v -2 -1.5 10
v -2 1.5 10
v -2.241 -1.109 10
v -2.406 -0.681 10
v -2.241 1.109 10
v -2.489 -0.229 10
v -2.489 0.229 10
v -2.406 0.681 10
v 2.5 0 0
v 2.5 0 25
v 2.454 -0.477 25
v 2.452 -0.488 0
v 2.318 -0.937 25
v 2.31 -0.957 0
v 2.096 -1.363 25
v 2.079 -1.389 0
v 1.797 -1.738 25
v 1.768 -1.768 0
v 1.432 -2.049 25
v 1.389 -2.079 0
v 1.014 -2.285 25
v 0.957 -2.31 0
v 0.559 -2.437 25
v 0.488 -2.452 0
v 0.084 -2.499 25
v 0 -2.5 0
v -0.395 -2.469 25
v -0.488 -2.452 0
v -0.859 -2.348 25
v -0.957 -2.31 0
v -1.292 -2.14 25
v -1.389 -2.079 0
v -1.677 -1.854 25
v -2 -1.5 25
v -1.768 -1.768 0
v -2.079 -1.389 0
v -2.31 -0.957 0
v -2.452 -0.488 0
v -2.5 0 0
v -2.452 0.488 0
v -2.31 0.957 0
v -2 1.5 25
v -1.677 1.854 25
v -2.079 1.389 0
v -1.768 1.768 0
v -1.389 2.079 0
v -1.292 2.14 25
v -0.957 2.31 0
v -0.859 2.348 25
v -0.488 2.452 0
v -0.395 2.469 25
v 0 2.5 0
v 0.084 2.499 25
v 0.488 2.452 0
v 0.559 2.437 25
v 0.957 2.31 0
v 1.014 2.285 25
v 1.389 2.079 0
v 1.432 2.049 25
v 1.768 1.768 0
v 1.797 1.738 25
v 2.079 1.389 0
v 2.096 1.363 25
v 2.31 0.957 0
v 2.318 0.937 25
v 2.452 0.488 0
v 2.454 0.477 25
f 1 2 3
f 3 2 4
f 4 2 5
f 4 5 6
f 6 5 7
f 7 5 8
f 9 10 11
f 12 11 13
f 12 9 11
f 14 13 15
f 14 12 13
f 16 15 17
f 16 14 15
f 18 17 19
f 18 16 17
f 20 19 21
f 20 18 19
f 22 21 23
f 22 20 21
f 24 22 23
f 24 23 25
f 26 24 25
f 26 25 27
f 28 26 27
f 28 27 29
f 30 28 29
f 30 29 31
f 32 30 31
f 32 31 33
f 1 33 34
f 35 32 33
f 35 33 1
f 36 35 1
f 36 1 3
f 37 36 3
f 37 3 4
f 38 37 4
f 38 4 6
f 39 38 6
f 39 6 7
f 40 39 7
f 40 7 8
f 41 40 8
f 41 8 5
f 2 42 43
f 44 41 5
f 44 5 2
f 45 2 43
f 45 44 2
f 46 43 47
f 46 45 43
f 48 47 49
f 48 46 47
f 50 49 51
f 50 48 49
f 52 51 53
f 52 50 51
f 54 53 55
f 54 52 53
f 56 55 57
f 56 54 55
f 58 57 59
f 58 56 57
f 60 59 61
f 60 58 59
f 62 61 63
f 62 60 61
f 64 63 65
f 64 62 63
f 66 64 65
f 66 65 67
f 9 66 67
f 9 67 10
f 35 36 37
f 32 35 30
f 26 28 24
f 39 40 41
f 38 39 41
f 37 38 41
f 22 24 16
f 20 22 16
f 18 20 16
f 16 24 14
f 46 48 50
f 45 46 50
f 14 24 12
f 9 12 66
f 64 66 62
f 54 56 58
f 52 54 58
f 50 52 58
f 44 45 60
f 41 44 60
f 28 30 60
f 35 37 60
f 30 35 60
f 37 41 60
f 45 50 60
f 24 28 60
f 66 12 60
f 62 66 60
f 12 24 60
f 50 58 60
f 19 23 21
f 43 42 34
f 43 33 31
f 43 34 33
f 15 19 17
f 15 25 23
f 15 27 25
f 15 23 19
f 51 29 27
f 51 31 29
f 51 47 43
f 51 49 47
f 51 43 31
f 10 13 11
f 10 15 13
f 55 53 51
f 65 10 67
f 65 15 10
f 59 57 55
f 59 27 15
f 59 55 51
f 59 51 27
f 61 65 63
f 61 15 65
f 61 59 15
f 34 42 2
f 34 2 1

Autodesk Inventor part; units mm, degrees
ref_plane "YZ Plane" through (0, 0, 0) normal (1, 0, 0) x (0, 1, 0)
ref_plane "XZ Plane" through (0, 0, 0) normal (0, 1, 0) x (-1, 0, 0)
ref_plane "XY Plane" through (0, 0, 0) normal (0, 0, 1) x (1, 0, 0)
sketch "Sketch1" plane through (0, 0, 0) normal (0, 0, 1) x (1, 0, 0)
  circle A0 centre (0, 0) radius 2.5
  dimension "d0" = 5
extrude "Extrusion1" add sketch "Sketch1" along normal blind 25
sketch "Sketch2" plane through (0, 0, 25) normal (0, 0, 1) x (1, 0, 0)
  circle A0 centre (0, 0) radius 2.5 projected
  line L0 (2.5, 0) -> (-2, 0)
  line L1 (-2, 0) -> (-2, 4)
  line L2 (-2, 0) -> (-2, -4)
  line L3 (-2, -4) -> (-6, -4)
  line L4 (-6, -4) -> (-6, 4)
  line L5 (-6, 4) -> (-2, 4)
  point P0 (-2, -1.5)
  point P1 (-2, 1.5)
  dimension "d3" = 4.5
  dimension "d6" = 4
  dimension "d7" = 4
  dimension "d8" = 4
extrude "Extrusion2" cut sketch "Sketch2" against normal blind 15 contours A0 L2 L3 L4 L5 L1
extrude "Extrusion3" cut sketch "Sketch2" against normal blind 15 contours L1 L2 A0
properties part number "AXE"
